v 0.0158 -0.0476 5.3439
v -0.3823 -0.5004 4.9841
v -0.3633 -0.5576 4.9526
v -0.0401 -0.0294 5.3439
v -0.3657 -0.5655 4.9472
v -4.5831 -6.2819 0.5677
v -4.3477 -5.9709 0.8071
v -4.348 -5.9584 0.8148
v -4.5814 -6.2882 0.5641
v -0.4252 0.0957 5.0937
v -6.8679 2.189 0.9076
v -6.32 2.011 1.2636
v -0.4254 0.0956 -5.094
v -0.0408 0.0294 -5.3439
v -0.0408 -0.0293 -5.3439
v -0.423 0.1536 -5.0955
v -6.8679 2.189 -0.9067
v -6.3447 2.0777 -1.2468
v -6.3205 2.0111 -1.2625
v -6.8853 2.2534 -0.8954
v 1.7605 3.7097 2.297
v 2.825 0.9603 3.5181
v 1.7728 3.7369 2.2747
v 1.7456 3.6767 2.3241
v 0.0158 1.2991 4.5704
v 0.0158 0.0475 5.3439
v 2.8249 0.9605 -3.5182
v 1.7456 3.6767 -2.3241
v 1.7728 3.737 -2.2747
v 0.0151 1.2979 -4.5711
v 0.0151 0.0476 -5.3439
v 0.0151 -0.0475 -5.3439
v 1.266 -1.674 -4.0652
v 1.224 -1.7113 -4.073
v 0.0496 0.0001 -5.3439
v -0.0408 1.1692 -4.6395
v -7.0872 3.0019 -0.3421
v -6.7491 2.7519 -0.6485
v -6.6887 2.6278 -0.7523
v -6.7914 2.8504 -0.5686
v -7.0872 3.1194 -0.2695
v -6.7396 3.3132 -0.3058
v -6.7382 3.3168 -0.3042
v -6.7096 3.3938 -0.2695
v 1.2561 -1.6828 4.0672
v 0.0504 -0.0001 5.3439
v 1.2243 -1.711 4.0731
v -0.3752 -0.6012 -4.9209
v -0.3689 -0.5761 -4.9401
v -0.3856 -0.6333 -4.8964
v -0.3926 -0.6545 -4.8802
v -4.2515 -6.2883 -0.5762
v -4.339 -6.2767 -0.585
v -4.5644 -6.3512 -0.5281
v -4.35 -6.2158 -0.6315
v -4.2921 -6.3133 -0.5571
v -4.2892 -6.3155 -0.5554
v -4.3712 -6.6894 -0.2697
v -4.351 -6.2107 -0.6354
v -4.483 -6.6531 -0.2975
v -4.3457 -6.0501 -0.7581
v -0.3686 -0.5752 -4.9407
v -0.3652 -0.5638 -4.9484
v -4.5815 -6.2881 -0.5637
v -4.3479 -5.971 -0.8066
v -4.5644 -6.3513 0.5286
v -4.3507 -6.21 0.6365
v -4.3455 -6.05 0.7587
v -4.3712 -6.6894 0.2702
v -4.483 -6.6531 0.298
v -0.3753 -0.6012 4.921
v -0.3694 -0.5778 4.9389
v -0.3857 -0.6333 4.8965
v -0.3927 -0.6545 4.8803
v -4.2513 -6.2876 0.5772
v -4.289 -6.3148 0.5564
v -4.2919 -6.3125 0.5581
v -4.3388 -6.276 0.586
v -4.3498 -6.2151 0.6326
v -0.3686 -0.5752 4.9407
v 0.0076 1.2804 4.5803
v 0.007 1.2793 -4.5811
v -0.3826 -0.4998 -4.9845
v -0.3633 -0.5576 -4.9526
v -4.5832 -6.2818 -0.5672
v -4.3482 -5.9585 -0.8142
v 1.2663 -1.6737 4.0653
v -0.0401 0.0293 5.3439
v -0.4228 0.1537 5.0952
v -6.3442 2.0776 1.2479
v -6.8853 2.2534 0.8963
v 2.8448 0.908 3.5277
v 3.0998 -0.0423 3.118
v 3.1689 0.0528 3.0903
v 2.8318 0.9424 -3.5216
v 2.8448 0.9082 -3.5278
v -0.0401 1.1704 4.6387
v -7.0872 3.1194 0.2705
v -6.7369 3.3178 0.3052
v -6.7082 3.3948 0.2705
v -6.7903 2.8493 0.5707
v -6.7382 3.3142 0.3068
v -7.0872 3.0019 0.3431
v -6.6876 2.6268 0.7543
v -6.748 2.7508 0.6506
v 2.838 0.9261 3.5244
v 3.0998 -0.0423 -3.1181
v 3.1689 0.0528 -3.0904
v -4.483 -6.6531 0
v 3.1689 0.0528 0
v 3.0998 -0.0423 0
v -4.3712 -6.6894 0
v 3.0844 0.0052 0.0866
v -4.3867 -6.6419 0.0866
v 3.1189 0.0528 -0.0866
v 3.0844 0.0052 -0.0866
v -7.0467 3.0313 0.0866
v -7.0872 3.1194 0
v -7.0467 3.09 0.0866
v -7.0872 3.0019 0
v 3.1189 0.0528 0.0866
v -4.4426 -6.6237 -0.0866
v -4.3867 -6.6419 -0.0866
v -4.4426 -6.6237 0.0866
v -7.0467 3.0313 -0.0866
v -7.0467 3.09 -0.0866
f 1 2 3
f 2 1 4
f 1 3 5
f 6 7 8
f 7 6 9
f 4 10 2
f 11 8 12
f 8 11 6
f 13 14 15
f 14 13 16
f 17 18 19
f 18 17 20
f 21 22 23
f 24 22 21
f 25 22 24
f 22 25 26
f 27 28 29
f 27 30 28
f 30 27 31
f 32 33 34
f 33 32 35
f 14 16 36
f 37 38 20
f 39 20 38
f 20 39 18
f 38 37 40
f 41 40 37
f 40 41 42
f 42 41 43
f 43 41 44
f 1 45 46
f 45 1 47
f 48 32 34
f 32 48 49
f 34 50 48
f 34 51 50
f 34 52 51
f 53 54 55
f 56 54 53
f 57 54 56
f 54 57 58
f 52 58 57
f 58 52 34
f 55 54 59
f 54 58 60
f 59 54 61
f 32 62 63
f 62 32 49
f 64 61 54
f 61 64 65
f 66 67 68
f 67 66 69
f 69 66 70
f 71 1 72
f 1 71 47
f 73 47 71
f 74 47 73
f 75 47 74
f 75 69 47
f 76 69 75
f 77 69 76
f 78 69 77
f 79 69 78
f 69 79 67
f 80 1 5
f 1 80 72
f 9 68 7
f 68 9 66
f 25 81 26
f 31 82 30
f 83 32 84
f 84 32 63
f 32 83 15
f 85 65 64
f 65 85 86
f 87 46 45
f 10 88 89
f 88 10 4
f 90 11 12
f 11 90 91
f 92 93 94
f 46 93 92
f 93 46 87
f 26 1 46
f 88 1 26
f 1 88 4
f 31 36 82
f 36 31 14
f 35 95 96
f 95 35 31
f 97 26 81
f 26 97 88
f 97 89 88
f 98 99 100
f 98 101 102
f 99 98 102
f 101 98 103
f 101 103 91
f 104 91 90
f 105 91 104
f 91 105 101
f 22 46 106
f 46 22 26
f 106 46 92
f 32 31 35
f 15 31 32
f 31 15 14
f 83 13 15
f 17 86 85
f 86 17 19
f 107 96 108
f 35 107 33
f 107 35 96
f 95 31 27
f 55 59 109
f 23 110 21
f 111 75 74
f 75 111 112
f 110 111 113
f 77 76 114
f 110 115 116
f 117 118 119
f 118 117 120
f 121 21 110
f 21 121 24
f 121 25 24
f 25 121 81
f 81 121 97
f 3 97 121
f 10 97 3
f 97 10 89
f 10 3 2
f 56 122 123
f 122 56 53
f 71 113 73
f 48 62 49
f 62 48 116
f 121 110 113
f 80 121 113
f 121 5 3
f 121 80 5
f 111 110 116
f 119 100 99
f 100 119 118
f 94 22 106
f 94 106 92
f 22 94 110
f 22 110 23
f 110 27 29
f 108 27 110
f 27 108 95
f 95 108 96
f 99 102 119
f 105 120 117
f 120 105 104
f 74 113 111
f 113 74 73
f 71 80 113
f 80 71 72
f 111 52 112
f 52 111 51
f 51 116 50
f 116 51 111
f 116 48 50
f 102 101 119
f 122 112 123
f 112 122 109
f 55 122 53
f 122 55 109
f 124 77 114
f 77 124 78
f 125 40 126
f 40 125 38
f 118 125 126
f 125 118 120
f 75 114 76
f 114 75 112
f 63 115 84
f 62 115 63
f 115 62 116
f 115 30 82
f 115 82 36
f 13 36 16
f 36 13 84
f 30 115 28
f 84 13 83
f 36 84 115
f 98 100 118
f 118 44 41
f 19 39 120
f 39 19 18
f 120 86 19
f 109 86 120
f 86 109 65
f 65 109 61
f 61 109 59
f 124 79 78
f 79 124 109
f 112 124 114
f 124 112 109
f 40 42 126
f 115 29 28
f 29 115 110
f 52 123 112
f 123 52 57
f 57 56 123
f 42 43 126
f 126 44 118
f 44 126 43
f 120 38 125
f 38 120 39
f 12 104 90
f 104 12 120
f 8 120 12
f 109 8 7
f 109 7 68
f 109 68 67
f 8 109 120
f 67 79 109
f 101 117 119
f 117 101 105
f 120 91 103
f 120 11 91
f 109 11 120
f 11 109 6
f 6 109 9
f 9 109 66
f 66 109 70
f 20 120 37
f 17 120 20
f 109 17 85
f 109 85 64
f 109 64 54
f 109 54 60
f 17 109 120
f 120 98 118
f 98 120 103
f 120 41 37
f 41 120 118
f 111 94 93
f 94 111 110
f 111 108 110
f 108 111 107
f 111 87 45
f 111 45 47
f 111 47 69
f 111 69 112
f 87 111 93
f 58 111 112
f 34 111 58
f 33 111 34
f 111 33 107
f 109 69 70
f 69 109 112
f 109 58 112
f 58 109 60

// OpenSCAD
// Auto-generated OpenSCAD file

    inner_points = 10*[[-0.7006292682253485, 0.30606485476032513, -6.130120740868102e-13], [0.30689198471783646, 0.005276334587299036, 6.130120740868102e-13], [-0.2720657717976499, -0.09620971856082147, 0.8090169943752502], [-0.27206577179637514, -0.09620971856314678, -0.8090169943746447], [5.5554147393444e-10, 0.8151018158228152, 0.49999999999920747], [5.563293437038652e-10, 0.8151018158213781, -0.5000000000007926], [-0.4402116662866258, -0.6594312211511645, 9.79654968021913e-13]];

    outer_points = 10*[[-3.627212082769728e-05, 5.120611380175485e-06, -0.5257311108429229], [3.627212082769728e-05, -5.120611380175485e-06, 0.5257311108429229], [0.8090169926260806, 0.26286555604709816, -5.325674888357133e-05], [-0.8090169922727908, 0.26286555604709816, 5.837736025155943e-05], [0.4999999983475059, -0.6881909602029435, -4.1199804176948946e-05], [-0.4999999992724306, -0.6881909602029435, 2.779386957237699e-05], [5.716348896531026e-10, 0.8506508083116905, 8.285323236583849e-06]];

    // Convex hull for inner set (I)
    module inner_hull() {
        hull() {
            for (p = inner_points) {
                translate(p) sphere(r=0.1);
            }
        }
    }

    // Convex hull for outer set (O) minus inner hull (O \ I)
    module outer_minus_inner() {
        difference() {
            hull() {
                for (p = outer_points) {
                    translate(p) sphere(r=0.1);
                }
            }
            inner_hull(); // Subtract inner hull
        }
    }

    // Convex hull for outer set (O) minus all translated inner hulls
    module outer_minus_AllTranslationInner() {
        difference() {
            hull() {
                for (p = outer_points) {
                    translate(p) sphere(r=0.1);
                }
            }
            hull() {
                translate([0,0,50]) inner_hull();
                translate([0,0,-50]) inner_hull();
            }; // Subtract translated inner hulls
        }
    }

    // Difference between outer_minus_inner and outer_minus_AllTranslationInner
    module outer_minus_inner_diff() {
        difference() {
            // Outer minus inner
            difference() {
                hull() {
                    for (p = outer_points) {
                        translate(p) sphere(r=0.1);
                    }
                }
                inner_hull();
            }

            // Subtract Outer minus AllTranslationInner
            difference() {
                hull() {
                    for (p = outer_points) {
                        translate(p) sphere(r=0.1);
                    }
                }
                hull() {
                    translate([0,0,50]) inner_hull();
                    translate([0,0,-50]) inner_hull();
                };
            }
        }
    }

    // Rendering all with colors applied
    color([1, 1, 0, 1]) outer_minus_inner_diff(); // Opaque yellow
    
